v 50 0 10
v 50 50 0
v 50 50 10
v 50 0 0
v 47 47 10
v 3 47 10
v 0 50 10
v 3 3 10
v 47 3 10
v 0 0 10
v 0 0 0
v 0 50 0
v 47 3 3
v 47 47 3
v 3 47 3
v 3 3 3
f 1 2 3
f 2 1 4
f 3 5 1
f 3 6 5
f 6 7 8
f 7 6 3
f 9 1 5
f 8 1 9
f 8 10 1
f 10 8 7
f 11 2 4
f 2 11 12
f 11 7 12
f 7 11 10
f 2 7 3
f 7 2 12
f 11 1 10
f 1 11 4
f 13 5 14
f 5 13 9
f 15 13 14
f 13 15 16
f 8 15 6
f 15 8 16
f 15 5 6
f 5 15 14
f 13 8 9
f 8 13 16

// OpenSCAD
// Generated by HEIDI for job job_1787769932754_b8d6c31a
// Product: 3D-Printable Model Preparation Package
// Request: Failure injection test
// Model type: box
// Generated: 2026-09-07T04:35:15.289Z
//
// This is a parameterized OpenSCAD model. You can adjust the
// parameters below to customize the dimensions before rendering.

// ─── Parameters ───
width = 50;       // X dimension in mm
height = 50;     // Y dimension in mm
depth = 10;       // Z dimension in mm
wall = 3;    // wall thickness in mm
$fn = 60;               // facet resolution

// Parametric hollow box
module parametric_box() {
    difference() {
        // Outer shell
        cube([width, height, depth]);
        // Inner cavity
        translate([wall, wall, wall])
            cube([width - wall * 2, height - wall * 2, depth - wall + 1]);
    }
}
parametric_box();
